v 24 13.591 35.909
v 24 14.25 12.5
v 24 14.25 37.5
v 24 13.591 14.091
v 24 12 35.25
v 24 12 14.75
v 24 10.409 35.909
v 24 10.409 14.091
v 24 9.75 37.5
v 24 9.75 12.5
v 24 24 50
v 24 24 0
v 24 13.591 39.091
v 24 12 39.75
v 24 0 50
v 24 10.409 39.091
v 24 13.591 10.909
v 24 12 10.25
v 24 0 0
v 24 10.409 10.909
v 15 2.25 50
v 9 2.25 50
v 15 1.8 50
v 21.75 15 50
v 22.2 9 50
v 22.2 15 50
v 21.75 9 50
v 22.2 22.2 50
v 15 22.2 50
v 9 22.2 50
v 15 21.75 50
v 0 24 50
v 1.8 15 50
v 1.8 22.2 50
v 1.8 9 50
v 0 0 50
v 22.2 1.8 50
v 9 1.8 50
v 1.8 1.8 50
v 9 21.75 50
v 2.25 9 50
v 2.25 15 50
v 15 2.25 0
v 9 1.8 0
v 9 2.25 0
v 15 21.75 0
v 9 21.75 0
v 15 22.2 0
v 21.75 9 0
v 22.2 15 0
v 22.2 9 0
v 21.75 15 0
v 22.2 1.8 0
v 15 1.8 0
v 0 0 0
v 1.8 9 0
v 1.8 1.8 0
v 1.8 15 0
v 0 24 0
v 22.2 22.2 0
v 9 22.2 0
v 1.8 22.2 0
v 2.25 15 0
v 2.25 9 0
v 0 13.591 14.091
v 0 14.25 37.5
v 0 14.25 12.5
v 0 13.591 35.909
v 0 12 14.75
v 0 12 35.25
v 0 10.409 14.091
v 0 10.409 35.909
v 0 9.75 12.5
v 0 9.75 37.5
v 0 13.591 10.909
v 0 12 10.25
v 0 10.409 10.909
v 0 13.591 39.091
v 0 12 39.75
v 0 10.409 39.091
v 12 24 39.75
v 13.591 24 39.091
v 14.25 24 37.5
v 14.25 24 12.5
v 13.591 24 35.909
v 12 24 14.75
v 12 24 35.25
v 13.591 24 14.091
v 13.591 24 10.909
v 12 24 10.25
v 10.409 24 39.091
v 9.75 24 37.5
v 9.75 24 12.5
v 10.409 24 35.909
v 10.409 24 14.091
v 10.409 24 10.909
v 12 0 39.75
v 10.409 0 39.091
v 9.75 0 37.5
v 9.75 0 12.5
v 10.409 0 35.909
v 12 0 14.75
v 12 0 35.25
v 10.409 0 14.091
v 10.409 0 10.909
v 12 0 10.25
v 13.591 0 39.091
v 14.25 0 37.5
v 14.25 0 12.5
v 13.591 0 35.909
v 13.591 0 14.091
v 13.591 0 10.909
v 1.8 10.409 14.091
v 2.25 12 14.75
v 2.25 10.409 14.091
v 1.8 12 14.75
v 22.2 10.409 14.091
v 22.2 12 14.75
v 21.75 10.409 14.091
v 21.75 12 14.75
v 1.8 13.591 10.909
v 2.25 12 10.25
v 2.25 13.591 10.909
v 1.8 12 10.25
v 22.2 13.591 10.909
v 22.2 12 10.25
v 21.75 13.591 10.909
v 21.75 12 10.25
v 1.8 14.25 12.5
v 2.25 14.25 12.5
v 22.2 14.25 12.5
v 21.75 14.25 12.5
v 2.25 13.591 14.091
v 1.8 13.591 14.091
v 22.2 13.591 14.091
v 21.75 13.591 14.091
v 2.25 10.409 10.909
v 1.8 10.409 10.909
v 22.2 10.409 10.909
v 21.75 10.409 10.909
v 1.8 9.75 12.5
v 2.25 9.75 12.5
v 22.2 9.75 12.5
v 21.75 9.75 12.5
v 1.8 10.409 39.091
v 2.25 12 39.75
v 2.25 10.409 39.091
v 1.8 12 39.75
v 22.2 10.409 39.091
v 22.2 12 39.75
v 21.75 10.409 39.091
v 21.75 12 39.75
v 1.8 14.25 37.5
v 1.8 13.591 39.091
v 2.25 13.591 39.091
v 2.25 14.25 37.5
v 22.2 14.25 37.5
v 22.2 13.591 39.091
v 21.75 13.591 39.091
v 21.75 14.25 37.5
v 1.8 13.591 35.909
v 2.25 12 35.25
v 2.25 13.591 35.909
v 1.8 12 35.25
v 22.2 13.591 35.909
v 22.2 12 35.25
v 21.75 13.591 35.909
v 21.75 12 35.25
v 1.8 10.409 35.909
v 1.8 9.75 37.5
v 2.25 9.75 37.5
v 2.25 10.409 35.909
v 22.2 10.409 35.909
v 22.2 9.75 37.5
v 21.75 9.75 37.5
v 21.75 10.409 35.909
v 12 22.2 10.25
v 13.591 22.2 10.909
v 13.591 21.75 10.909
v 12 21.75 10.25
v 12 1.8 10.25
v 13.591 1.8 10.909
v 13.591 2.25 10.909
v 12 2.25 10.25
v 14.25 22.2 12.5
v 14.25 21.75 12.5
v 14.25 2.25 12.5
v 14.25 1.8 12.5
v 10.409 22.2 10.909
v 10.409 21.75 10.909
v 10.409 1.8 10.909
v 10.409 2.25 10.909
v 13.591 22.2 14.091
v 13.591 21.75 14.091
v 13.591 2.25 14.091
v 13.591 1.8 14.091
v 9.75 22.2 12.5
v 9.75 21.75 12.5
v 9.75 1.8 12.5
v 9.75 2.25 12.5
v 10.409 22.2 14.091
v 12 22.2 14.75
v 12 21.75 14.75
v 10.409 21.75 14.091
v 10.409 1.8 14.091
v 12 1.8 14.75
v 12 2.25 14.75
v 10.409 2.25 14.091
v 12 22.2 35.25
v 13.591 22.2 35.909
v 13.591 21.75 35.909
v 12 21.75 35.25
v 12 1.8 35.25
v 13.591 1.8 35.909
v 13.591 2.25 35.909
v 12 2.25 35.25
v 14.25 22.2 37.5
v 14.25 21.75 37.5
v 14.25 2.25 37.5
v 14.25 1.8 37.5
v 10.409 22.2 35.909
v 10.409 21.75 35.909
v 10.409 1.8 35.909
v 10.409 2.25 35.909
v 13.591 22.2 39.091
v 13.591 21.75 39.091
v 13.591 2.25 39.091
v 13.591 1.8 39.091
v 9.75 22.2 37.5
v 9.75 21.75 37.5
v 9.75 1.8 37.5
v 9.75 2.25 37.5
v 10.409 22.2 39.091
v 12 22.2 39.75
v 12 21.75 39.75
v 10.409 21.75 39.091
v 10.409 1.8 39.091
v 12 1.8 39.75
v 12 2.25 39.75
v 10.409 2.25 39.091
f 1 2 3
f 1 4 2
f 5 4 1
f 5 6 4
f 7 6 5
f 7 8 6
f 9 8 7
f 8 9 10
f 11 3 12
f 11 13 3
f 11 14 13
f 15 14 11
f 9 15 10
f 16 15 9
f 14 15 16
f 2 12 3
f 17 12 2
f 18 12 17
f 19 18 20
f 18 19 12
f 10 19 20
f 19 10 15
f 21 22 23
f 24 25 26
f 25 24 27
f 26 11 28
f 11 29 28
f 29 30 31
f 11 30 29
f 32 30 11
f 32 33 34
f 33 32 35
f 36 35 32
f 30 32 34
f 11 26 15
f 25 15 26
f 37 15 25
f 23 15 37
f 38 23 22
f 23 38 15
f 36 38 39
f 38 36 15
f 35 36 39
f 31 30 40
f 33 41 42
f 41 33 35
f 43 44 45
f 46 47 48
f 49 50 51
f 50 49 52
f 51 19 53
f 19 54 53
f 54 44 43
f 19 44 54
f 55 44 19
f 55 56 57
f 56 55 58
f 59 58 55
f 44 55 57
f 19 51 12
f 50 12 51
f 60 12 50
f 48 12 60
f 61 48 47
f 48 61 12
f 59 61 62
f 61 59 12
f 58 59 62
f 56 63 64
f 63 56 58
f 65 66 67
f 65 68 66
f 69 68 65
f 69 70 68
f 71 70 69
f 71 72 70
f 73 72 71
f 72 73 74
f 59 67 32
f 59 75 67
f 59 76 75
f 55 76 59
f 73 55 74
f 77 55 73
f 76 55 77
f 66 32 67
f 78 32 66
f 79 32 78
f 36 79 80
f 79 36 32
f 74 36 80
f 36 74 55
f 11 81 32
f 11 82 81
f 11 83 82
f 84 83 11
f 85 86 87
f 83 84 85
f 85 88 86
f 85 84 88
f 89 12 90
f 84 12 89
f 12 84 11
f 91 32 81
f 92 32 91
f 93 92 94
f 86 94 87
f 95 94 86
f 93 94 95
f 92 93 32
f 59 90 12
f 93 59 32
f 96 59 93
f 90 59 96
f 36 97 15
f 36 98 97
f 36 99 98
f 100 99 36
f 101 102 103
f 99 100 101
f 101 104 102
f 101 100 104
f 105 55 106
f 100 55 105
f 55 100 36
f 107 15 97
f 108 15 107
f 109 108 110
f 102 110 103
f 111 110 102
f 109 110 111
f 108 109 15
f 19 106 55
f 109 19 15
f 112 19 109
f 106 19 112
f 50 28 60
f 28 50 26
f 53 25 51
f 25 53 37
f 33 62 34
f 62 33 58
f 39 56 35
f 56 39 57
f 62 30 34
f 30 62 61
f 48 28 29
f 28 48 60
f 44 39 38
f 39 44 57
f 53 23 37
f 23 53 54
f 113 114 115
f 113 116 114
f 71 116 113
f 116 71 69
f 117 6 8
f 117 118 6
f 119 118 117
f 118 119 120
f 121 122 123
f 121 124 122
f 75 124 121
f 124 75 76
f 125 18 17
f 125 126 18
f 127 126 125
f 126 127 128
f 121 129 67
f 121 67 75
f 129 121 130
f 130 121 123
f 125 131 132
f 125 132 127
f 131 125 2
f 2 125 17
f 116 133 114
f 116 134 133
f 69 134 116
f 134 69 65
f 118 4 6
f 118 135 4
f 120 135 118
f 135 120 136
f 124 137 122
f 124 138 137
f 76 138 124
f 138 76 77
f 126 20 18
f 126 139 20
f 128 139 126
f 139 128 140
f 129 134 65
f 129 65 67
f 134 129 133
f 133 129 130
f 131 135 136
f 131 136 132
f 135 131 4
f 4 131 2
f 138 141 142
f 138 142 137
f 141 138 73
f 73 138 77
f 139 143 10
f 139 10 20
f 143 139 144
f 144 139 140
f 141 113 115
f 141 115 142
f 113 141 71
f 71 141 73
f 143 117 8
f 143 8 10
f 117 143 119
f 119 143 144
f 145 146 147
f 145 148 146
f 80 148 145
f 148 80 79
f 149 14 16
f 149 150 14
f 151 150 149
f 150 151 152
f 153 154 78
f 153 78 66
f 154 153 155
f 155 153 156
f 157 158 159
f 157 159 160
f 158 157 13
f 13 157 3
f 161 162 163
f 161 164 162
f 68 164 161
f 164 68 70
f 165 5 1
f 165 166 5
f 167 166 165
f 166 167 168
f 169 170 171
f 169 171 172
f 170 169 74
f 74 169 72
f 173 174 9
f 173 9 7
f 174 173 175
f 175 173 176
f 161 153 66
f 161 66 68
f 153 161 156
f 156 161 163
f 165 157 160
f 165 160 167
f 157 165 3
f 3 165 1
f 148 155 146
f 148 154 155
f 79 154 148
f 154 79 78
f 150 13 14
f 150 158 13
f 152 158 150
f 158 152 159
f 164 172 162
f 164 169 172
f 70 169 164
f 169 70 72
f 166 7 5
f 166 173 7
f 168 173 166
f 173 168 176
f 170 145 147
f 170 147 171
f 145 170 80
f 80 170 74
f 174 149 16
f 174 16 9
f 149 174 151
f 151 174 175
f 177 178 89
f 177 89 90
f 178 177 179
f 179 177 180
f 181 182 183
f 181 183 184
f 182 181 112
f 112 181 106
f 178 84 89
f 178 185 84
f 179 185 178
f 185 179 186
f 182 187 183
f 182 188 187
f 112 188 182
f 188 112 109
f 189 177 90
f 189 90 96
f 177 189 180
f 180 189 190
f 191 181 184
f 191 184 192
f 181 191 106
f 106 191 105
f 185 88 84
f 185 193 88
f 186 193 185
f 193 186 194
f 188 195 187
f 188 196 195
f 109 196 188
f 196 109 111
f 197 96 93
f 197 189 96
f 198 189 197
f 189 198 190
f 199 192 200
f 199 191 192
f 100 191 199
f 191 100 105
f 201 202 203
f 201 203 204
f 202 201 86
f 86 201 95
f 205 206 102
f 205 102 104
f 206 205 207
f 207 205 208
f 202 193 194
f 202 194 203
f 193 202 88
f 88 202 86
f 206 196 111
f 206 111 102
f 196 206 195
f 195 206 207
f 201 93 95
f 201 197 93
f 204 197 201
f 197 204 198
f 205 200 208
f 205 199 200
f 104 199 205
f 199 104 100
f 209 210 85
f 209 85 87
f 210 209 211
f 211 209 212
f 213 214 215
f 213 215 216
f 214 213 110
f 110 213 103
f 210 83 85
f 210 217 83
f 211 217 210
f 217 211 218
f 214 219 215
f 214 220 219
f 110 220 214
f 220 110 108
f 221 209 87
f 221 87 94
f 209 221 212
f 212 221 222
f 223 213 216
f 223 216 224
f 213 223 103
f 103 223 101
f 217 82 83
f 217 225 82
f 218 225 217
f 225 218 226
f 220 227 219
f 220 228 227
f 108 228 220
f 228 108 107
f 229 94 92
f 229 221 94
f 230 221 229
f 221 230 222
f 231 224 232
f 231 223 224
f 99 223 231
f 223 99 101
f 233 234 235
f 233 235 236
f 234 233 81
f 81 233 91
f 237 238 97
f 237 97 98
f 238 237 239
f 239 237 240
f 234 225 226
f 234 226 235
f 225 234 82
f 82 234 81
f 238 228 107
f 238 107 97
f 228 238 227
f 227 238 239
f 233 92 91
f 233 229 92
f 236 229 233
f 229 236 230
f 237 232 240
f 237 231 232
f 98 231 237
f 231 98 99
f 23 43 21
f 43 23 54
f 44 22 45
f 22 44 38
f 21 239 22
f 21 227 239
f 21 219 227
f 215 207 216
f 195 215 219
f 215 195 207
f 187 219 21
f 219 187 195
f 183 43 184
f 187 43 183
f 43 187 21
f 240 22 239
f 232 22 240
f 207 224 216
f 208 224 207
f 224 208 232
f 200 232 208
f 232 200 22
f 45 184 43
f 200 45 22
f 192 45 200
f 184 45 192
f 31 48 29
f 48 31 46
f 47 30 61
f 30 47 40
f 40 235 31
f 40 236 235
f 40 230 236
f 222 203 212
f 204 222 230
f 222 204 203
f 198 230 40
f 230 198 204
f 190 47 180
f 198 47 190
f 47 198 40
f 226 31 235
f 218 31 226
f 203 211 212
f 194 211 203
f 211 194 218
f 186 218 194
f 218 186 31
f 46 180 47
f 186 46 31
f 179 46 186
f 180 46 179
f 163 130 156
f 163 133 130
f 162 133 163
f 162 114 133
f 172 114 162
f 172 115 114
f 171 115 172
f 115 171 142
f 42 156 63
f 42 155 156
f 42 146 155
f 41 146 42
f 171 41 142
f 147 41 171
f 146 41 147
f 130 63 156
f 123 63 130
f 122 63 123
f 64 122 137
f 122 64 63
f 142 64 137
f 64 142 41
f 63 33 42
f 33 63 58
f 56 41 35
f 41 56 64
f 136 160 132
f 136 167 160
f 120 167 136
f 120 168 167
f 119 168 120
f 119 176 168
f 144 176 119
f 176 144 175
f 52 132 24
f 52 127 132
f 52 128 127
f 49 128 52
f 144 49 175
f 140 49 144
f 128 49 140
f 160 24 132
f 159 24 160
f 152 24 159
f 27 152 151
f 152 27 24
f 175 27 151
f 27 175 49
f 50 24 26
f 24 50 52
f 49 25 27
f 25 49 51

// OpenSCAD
//Specify the height
Height = 50 ; // [50:5:100]
//Height for screws
Screwholes = 12.5 ; // [10:0.5:15]

2020_ProfileCombiner ();

module 2020_ProfileCombiner() {
    difference () {
        translate ([0,0,0]) cube ([24,24,Height]);
        translate ([1.80,1.80,-1]) cube ([20.40,20.40,Height+2]);

        translate ([-3,12,Screwholes]) rotate ([0,90,0]) cylinder (d=4.5,h=30);
        translate ([-3,12,Height-Screwholes]) rotate ([0,90,0]) cylinder (d=4.5,h=30);
        translate ([12,-3,Screwholes]) rotate ([-90,0,0]) cylinder (d=4.5,h=30);
        translate ([12,-3,Height-Screwholes]) rotate ([-90,0,0]) cylinder (d=4.5,h=30);

    }
    difference() {
        union () {
            translate ([9,0,0]) cube ([6,2.25,Height]);
            translate ([9,24-2.25,0]) cube ([6,2.25,Height]);
            translate ([0,9,0]) cube ([2.25,6,Height]);
            translate ([24-2.25,9,0]) cube ([2.25,6,Height]);
        }
        translate ([-3,12,Screwholes]) rotate ([0,90,0]) cylinder (d=4.5,h=30);
        translate ([-3,12,Height-Screwholes]) rotate ([0,90,0]) cylinder (d=4.5,h=30);
        translate ([12,-3,Screwholes]) rotate ([-90,0,0]) cylinder (d=4.5,h=30);
        translate ([12,-3,Height-Screwholes]) rotate ([-90,0,0]) cylinder (d=4.5,h=30);
    }
}
